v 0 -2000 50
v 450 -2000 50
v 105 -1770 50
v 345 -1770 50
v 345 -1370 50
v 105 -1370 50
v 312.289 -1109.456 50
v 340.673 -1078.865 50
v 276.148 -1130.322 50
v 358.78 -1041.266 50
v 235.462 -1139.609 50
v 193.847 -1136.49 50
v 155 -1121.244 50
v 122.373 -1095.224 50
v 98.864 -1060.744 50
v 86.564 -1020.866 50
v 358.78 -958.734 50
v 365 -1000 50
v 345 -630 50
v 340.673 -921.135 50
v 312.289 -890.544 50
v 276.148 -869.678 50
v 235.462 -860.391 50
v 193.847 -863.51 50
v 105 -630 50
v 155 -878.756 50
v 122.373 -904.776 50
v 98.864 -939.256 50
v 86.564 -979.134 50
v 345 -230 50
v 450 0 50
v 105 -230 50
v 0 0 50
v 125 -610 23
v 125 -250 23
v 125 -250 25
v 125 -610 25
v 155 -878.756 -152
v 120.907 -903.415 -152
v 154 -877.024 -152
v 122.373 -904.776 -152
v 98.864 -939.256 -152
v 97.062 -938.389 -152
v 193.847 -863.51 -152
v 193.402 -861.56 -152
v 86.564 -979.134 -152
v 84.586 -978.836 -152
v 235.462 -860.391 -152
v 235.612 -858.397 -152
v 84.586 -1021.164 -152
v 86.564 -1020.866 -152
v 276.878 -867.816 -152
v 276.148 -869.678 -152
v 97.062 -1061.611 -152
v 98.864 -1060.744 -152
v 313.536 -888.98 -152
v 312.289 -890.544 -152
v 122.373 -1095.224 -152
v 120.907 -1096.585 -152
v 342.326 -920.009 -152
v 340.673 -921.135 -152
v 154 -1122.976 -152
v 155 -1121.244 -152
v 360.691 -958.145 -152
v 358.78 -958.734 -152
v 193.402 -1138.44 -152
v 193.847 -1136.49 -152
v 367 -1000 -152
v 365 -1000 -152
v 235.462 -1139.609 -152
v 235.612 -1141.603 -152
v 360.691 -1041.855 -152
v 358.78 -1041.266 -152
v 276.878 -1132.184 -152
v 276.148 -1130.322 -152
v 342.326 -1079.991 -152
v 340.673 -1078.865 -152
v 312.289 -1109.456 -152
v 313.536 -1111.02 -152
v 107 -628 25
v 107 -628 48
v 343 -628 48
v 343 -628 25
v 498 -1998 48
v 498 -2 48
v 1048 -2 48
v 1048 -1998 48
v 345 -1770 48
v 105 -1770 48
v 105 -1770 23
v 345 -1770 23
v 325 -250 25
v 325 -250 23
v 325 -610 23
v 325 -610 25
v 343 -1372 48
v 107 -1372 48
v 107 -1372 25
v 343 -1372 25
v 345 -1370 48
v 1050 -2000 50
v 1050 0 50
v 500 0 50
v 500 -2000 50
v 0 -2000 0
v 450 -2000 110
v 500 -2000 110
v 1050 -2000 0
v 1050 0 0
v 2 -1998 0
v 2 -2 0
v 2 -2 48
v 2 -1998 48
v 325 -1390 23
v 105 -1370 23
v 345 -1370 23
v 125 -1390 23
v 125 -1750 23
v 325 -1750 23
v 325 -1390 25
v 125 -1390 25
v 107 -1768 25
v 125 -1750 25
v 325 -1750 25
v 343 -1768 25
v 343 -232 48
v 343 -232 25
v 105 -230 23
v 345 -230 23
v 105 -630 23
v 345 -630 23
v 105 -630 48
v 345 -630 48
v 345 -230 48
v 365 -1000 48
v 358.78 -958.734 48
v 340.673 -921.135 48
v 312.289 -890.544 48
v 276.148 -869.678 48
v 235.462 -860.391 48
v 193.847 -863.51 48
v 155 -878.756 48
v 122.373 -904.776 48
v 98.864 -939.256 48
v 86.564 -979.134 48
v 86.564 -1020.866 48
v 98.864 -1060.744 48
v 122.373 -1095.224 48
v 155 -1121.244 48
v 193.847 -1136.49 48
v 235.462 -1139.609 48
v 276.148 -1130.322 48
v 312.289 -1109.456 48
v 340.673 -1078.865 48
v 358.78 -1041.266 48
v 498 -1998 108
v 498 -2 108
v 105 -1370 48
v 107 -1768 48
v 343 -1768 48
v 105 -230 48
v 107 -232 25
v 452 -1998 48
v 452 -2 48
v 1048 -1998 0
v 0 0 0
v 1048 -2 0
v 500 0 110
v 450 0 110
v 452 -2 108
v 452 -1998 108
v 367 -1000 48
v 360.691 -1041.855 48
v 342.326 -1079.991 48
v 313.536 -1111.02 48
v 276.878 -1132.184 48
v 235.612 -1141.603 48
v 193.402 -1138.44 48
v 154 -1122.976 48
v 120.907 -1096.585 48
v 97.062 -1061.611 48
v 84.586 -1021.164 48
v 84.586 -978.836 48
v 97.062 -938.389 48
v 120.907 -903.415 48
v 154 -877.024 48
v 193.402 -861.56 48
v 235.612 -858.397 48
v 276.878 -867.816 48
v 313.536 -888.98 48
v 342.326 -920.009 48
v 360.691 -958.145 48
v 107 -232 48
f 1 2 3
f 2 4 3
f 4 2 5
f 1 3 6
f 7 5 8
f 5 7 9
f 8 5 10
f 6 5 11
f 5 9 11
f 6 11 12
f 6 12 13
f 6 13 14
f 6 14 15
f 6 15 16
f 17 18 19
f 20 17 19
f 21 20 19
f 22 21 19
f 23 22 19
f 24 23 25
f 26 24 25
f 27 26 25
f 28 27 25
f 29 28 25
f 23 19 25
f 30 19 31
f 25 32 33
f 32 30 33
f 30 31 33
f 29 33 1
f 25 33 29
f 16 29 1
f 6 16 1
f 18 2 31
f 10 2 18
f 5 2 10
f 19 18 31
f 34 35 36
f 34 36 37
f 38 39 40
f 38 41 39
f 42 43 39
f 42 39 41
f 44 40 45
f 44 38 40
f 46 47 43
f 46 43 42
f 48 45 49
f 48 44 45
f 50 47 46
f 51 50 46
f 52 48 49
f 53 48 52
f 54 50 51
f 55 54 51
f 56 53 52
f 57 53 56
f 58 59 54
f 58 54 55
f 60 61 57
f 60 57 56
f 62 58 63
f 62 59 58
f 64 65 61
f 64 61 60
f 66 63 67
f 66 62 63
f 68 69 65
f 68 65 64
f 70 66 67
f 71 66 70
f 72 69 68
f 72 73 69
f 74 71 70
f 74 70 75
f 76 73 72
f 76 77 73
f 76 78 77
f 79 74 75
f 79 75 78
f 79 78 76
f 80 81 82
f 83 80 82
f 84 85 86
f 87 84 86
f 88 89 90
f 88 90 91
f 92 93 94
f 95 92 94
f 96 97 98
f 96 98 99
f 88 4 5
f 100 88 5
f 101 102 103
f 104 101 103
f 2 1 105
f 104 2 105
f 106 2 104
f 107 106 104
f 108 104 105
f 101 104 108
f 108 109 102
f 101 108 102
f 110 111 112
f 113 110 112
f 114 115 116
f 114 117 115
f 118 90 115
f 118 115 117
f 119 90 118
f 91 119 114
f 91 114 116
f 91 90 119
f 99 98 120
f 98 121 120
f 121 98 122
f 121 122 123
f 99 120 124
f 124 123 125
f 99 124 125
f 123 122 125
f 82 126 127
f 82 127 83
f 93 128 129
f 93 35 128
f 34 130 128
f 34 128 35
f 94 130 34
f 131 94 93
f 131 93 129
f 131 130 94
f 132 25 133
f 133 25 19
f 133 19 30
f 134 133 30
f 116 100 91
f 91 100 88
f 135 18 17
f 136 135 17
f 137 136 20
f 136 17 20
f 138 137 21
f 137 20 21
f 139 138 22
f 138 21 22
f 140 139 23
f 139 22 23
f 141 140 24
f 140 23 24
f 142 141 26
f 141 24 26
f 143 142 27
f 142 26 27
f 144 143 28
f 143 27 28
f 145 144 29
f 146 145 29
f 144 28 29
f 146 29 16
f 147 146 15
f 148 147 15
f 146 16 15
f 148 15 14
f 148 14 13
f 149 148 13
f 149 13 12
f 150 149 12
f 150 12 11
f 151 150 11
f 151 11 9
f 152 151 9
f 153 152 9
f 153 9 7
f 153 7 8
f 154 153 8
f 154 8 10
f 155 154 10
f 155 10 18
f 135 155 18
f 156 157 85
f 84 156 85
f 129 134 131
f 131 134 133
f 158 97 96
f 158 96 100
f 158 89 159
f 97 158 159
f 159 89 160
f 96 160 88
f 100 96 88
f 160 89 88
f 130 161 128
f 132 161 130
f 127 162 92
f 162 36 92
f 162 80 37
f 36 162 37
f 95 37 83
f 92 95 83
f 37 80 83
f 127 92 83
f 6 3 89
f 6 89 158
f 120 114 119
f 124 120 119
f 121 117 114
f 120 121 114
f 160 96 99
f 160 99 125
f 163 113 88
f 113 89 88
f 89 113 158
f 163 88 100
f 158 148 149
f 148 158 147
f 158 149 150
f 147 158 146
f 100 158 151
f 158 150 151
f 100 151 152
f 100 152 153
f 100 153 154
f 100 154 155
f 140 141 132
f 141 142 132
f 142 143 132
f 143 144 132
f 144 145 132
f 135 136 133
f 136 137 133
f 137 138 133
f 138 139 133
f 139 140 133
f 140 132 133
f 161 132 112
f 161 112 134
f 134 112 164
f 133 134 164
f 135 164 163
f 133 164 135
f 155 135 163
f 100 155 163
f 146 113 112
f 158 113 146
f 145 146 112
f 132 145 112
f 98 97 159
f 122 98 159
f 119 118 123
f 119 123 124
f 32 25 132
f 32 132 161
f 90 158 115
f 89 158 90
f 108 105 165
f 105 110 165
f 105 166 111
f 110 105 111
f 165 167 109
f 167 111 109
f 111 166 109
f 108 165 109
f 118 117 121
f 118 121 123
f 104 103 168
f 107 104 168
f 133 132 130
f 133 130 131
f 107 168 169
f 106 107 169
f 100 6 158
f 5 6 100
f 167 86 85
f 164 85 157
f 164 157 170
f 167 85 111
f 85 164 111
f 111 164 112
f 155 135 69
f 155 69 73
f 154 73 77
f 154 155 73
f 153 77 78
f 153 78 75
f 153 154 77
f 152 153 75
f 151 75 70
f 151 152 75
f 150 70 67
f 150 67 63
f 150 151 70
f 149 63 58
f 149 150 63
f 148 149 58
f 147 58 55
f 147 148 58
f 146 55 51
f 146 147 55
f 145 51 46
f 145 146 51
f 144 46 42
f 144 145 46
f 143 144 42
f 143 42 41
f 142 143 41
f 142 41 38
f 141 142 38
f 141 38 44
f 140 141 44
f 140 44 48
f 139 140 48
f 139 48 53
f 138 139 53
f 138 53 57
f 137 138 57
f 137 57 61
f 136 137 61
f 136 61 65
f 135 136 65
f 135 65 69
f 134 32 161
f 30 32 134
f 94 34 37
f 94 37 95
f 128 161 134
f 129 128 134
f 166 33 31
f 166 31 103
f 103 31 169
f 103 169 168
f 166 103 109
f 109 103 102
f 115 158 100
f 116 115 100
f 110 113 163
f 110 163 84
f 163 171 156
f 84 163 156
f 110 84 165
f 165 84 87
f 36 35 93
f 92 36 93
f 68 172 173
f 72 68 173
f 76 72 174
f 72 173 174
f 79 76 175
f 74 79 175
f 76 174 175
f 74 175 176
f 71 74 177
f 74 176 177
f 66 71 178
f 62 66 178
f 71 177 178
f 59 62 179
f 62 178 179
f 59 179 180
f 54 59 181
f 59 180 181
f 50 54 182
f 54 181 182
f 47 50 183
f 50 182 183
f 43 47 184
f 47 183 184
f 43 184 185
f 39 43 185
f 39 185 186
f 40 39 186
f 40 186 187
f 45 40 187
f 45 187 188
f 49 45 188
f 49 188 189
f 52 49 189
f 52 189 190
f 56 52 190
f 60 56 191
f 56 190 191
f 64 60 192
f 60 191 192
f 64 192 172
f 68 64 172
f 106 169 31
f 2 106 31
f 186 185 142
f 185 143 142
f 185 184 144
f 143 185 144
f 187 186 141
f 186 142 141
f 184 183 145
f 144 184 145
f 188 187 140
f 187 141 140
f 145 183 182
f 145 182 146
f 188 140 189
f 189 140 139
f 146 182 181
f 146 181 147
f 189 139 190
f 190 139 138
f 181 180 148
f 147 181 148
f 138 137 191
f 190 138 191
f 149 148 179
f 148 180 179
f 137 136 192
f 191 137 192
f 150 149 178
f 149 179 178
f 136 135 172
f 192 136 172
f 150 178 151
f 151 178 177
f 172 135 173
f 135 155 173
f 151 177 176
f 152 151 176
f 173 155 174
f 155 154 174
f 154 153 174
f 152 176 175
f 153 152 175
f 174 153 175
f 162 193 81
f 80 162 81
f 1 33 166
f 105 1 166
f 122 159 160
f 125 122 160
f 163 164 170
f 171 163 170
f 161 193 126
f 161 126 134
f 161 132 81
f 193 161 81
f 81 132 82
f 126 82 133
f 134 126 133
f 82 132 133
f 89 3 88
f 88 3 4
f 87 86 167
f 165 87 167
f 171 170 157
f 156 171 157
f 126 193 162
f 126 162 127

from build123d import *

# Parameters (mm, degrees)
F1_DEPTH  = 2000
F2_R      = 140
F2_W      = 240
F2_H      = 400
F3_DEPTH  = 25
F4_W      = 240
F4_H      = 400
F5_DEPTH  = 25
F6_T      = -2
F6_2_T    = -2
F7_W      = 200
F7_H      = 360
F8_DEPTH  = 25
F9_R      = 142
F10_DEPTH = 200
F11_T     = -2
F13_DEPTH = 2
F15_DEPTH = 2


with BuildPart() as f1:
    # F0 (on Front) → F1 (new body)
    with BuildSketch(Plane.XZ):
        Polygon((0, 50), (0, 0), (2, 0), (2, 48), (452, 48), (452, 108), (498, 108), (498, 48), (1048, 48), (1048, 0), (1050, 0), (1050, 50), (500, 50), (500, 110), (450, 110), (450, 50), align=None)
    extrude(amount=F1_DEPTH)

    # F2 (on face) → F3 (cut)
    with BuildSketch(Plane.XY.offset(50)):
        with Locations((225, -1000)):
            Circle(F2_R)
        with Locations((225, -430)):
            Rectangle(F2_W, F2_H)
        with Locations((225, -1570)):
            Rectangle(F2_W, F2_H)
    extrude(amount=-F3_DEPTH, mode=Mode.SUBTRACT)

    # F12 (on face) → F13 (join)
    with BuildSketch(Plane(origin=(0, 0, 0), x_dir=(-1, 0, 0), z_dir=(0, 1, 0))):
        Polygon((-1050, 50), (-1050, 0), (0, 0), (0, 50), (-450, 50), (-450, 110), (-500, 110), (-500, 50), align=None)
    extrude(amount=-F13_DEPTH)

    # F14 (on face) → F15 (join)
    with BuildSketch(Plane.XZ.offset(2000)):
        Polygon((0, 50), (0, 0), (1050, 0), (1050, 50), (500, 50), (500, 110), (450, 110), (450, 50), align=None)
    extrude(amount=-F15_DEPTH)


with BuildPart() as f5:
    # F4 (on face) → F5 (new body)
    with BuildSketch(Plane(origin=(0, 0, 48), x_dir=(1, 0, 0), z_dir=(0, 0, -1))):
        with Locations((225, 430)):
            Rectangle(F4_W, F4_H)
    extrude(amount=F5_DEPTH)

    # F6
    f6_openings = [f5.faces().sort_by_distance(p)[0] for p in [
        (225, -430, 48),
    ]]
    offset(amount=F6_T, openings=f6_openings)


with BuildPart() as f5b:
    # F4 (on face) → F5, piece 2 (new body)
    with BuildSketch(Plane(origin=(0, 0, 48), x_dir=(1, 0, 0), z_dir=(0, 0, -1))):
        with Locations((225, 1570)):
            Rectangle(F4_W, F4_H)
    extrude(amount=F5_DEPTH)

    # F6#2
    f6_2_openings = [f5b.faces().sort_by_distance(p)[0] for p in [
        (225, -1570, 48),
    ]]
    offset(amount=F6_2_T, openings=f6_2_openings)


with BuildPart() as f8_tool:
    # F7 (on face) → F8 (new body)
    with BuildSketch(Plane(origin=(0, 0, 23), x_dir=(1, 0, 0), z_dir=(0, 0, -1))):
        with Locations((225, 430)):
            Rectangle(F7_W, F7_H)
        with Locations((225, 1570)):
            Rectangle(F7_W, F7_H)
    extrude(amount=-F8_DEPTH)


with BuildPart() as f5_1:
    add(f5.part)

    # F8: cut by f8_tool
    add(f8_tool.part, mode=Mode.SUBTRACT)


with BuildPart() as f5b_1:
    add(f5b.part)

    # F8: cut by f8_tool
    add(f8_tool.part, mode=Mode.SUBTRACT)


with BuildPart() as f10:
    # F9 (on face) → F10 (new body)
    with BuildSketch(Plane(origin=(0, 0, 48), x_dir=(1, 0, 0), z_dir=(0, 0, -1))):
        with Locations((225, 1000)):
            Circle(F9_R)
    extrude(amount=F10_DEPTH)

    # F11
    f11_openings = [f10.faces().sort_by_distance(p)[0] for p in [
        (225, -1000, 48),
        (225, -1000, -152),
    ]]
    offset(amount=F11_T, openings=f11_openings)


solid = Compound([f1.part, f5_1.part, f5b_1.part, f10.part])
